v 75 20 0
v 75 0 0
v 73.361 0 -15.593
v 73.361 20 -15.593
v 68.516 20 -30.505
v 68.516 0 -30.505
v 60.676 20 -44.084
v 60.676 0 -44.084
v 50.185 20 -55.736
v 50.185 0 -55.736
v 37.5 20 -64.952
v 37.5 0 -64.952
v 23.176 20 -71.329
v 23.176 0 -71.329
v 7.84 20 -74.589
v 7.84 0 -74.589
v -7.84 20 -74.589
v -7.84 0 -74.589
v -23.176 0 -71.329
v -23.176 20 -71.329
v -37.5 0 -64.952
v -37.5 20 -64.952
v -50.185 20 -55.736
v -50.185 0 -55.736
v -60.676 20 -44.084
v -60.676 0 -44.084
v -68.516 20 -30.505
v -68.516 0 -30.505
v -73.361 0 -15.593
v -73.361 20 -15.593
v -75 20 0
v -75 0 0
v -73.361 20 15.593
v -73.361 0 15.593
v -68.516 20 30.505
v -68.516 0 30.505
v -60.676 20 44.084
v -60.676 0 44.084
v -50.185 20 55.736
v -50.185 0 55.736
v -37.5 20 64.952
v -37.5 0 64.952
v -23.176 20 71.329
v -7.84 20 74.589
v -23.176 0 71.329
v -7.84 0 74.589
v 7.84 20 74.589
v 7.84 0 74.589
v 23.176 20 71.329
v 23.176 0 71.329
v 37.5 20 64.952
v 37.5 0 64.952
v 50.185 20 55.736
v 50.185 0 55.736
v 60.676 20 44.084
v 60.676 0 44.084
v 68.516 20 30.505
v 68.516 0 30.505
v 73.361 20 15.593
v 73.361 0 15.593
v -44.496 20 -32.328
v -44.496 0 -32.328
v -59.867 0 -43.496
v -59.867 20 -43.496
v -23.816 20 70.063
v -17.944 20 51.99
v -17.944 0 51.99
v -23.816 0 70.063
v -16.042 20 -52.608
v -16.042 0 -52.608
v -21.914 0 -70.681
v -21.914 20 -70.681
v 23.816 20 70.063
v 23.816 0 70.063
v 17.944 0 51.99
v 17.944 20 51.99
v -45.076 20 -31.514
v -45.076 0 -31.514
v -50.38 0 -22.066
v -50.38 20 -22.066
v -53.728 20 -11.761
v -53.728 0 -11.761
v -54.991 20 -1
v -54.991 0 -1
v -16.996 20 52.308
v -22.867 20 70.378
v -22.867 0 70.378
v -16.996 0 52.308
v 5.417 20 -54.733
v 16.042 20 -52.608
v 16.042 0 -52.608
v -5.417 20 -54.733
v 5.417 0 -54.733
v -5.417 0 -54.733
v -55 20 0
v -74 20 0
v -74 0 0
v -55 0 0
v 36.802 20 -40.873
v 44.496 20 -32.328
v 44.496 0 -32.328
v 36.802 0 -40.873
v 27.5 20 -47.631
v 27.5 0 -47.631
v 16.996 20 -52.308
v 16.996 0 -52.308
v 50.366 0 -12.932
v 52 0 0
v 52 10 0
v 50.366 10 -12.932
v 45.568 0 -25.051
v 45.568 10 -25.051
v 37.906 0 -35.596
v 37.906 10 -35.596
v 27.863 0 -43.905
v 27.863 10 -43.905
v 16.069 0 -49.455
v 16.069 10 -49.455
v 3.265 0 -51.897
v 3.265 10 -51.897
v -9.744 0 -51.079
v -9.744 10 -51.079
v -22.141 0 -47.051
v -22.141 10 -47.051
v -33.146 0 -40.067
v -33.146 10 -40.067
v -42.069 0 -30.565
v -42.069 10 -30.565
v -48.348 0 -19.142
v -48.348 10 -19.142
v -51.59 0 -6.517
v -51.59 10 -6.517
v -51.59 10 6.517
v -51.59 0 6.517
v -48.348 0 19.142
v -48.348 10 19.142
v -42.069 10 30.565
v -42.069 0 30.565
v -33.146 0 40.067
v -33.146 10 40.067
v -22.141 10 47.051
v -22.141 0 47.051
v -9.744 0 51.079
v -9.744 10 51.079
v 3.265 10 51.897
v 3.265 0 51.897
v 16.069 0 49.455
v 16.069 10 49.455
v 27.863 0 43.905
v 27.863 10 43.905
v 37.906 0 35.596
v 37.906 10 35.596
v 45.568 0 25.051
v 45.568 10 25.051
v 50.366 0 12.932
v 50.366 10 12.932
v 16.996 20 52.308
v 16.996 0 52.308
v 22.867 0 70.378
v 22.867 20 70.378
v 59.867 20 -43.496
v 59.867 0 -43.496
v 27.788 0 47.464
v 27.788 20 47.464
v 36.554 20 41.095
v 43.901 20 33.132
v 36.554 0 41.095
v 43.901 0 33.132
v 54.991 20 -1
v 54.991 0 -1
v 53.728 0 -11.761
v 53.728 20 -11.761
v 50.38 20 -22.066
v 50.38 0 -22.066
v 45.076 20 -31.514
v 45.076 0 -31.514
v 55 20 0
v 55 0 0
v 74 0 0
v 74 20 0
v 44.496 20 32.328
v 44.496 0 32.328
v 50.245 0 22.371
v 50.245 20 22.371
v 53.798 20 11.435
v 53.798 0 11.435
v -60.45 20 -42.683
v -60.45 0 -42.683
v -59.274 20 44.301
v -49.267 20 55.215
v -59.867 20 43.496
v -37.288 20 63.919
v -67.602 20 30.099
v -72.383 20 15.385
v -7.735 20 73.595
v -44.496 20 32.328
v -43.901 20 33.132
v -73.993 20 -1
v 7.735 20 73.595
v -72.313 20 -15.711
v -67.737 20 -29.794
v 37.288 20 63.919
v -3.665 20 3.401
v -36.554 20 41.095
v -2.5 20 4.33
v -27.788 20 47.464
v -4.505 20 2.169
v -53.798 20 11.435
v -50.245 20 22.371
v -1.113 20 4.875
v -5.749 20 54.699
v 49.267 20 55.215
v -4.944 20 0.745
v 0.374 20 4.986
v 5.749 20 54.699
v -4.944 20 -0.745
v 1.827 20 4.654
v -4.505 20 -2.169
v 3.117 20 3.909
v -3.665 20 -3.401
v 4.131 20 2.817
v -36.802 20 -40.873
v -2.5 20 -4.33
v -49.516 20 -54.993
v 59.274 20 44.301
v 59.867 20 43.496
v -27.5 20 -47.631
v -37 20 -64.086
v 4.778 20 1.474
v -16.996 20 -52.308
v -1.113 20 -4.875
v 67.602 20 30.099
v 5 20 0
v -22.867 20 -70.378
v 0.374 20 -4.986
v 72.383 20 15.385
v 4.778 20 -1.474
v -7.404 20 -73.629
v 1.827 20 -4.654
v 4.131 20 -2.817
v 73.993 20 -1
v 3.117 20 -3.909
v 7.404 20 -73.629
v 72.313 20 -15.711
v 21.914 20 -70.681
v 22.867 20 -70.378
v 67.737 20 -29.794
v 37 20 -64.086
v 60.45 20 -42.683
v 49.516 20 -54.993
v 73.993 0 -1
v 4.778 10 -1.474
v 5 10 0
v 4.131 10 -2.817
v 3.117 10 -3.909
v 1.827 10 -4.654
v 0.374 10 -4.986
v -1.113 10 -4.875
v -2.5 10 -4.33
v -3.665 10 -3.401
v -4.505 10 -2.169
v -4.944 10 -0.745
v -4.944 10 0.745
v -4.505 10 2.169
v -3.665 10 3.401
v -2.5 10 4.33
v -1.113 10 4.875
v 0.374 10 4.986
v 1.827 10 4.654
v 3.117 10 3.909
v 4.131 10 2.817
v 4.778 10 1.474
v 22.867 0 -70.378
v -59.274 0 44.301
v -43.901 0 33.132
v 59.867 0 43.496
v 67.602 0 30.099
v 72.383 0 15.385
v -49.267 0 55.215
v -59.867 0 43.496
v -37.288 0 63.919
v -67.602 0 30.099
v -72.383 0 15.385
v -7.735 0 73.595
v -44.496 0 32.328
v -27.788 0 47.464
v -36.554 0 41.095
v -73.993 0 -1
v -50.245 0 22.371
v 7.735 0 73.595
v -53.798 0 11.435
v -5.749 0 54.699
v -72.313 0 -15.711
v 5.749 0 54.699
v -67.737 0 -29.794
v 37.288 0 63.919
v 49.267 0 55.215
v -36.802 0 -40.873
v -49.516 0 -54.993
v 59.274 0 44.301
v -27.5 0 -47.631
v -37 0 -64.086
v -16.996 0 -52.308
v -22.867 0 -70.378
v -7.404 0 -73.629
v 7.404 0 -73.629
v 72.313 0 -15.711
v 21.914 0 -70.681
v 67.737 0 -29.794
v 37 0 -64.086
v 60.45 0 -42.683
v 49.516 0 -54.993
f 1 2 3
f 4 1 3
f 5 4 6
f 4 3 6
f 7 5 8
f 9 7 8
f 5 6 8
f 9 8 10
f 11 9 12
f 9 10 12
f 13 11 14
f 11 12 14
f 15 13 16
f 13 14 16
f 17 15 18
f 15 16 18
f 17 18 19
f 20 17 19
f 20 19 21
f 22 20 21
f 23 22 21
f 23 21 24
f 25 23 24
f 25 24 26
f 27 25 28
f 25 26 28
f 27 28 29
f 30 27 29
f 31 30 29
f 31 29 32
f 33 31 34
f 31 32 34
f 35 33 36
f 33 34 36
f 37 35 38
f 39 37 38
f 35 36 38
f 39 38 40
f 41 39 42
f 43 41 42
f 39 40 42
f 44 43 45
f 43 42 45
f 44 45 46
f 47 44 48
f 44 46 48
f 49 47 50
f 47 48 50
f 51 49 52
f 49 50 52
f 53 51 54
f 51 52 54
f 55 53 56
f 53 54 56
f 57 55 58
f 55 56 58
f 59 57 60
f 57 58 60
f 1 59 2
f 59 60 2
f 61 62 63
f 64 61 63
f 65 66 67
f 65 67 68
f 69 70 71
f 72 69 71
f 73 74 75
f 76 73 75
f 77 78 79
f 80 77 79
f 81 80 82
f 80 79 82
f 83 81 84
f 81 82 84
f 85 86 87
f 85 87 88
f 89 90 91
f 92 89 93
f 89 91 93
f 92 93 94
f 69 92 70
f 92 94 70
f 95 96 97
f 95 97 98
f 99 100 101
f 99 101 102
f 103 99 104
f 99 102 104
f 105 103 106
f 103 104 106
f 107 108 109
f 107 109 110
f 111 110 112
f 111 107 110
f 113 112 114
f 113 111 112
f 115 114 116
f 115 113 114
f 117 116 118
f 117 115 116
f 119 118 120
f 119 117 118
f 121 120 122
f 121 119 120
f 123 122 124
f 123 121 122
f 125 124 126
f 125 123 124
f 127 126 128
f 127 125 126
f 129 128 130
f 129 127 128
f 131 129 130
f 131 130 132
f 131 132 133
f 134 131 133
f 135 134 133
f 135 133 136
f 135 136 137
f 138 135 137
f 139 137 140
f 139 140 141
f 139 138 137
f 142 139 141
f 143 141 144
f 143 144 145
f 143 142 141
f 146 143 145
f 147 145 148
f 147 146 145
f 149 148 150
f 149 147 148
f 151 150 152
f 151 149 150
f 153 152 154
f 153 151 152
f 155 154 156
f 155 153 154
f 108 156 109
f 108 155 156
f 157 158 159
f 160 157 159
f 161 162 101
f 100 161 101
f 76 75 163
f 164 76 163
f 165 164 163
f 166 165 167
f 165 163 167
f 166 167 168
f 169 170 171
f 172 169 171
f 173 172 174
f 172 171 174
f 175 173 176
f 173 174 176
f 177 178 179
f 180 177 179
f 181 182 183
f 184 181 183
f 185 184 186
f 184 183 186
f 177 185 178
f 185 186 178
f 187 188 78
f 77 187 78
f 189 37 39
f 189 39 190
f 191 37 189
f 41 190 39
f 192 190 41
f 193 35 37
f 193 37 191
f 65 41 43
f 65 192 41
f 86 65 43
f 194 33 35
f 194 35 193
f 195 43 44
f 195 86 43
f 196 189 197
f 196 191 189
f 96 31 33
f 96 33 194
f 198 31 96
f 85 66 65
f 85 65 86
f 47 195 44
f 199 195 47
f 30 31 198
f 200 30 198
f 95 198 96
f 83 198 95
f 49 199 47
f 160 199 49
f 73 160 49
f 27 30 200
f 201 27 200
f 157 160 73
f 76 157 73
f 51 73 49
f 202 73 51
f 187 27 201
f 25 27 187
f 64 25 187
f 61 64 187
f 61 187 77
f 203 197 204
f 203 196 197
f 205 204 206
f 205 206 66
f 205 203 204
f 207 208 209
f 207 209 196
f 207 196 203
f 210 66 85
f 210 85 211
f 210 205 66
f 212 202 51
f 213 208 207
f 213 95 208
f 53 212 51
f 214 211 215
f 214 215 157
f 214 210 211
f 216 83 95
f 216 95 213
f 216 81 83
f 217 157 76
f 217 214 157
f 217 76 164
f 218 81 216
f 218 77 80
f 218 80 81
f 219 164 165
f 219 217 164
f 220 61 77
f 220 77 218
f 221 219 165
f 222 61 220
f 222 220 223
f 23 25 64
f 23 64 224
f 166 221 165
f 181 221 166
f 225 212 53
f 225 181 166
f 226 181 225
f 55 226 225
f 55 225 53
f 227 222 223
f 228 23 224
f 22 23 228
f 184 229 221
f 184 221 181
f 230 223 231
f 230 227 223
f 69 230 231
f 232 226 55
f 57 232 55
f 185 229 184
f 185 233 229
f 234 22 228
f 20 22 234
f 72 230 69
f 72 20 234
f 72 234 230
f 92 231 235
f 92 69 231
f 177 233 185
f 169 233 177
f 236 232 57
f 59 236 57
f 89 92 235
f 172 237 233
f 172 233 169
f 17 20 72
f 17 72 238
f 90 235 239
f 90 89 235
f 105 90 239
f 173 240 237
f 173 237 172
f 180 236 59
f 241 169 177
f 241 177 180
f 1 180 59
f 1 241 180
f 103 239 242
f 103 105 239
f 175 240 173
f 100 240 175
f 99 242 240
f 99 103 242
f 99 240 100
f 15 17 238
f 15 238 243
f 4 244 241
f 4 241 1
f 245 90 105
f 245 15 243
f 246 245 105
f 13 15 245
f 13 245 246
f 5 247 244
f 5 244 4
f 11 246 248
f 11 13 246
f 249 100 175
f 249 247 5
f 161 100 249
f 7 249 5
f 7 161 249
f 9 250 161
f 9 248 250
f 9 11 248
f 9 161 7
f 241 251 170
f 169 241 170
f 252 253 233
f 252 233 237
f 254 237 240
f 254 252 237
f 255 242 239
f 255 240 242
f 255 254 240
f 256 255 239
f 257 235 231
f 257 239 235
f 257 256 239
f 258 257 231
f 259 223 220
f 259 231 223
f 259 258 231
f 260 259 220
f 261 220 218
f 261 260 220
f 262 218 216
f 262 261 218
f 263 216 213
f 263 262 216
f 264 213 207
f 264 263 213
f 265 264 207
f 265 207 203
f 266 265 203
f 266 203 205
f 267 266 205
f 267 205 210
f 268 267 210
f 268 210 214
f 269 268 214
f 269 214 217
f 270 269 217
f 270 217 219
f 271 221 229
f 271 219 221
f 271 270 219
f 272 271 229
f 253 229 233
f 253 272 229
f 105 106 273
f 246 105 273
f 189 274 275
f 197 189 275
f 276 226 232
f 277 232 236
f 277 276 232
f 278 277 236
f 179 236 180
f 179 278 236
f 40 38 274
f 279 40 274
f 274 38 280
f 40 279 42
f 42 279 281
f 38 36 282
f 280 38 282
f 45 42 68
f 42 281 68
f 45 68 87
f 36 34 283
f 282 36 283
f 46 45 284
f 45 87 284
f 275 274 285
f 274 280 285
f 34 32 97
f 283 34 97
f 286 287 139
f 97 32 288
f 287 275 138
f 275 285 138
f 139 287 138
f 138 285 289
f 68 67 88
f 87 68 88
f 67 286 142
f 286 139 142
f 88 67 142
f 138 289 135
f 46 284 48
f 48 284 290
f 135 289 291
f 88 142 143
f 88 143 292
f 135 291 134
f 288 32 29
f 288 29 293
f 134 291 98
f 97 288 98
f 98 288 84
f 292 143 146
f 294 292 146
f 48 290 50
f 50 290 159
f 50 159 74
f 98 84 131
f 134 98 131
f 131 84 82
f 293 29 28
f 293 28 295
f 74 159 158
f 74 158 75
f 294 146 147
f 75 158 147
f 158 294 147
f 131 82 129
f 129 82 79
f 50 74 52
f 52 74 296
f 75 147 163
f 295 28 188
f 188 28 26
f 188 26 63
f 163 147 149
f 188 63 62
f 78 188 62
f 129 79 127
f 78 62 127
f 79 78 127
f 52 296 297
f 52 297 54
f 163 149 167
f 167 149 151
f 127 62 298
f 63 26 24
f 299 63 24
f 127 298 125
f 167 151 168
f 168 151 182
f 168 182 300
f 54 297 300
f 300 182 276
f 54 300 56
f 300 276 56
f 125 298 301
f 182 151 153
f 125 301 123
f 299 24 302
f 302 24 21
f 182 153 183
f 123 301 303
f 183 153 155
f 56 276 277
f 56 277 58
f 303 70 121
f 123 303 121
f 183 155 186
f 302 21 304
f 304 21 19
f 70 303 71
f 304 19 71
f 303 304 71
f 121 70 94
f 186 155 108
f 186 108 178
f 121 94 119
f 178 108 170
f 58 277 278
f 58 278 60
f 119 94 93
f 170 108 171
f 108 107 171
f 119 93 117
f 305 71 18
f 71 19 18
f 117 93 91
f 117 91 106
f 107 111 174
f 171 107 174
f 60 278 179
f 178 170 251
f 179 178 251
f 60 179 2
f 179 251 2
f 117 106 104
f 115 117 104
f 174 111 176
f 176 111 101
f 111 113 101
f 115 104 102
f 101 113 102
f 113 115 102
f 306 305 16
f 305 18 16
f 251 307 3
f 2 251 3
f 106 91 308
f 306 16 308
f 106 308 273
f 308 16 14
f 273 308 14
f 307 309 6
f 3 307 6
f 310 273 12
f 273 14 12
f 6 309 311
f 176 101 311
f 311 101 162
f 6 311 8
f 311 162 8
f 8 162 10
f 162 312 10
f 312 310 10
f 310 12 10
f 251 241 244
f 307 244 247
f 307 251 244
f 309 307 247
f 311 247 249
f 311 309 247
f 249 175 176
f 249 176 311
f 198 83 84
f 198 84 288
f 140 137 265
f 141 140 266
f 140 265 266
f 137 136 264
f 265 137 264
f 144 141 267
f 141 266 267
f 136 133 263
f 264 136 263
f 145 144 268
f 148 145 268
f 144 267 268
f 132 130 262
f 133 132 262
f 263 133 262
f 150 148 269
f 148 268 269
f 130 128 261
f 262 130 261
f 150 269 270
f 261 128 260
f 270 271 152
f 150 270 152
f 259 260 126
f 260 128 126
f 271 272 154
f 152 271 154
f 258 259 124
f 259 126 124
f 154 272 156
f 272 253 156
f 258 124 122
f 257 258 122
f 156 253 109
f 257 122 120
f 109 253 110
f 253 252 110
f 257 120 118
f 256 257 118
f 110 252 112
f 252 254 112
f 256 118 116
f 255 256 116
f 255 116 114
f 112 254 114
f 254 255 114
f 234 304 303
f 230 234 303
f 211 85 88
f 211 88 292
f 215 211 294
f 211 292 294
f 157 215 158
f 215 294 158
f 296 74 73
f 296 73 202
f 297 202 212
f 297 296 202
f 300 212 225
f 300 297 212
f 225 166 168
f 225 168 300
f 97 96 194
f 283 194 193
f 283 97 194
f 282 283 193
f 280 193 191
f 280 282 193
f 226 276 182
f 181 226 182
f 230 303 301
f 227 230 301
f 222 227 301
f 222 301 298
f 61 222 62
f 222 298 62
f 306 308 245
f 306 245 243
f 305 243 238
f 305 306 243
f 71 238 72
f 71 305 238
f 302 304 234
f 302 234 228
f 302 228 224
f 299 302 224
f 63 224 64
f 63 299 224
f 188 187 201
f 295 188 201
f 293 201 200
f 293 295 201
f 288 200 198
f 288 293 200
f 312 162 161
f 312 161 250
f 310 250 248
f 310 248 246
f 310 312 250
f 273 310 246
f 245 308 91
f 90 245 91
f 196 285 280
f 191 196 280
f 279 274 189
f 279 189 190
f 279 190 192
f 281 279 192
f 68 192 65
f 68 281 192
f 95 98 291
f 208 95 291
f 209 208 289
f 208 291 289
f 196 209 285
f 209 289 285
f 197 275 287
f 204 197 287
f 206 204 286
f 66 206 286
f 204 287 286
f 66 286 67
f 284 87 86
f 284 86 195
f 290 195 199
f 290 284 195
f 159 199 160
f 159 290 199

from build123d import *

# Parameters (mm, degrees)
SKETCH1_R           = 75
SKETCH1_R_2         = 74
BOSS_EXTRUDE1_DEPTH = 20
SKETCH2_R           = 55
BOSS_EXTRUDE2_DEPTH = 20
BOSS_EXTRUDE3_DEPTH = 20
SKETCH4_R           = 52
CUT_EXTRUDE3_DEPTH  = 10
SKETCH5_R           = 5
CUT_EXTRUDE4_DEPTH  = 21


with BuildPart() as part:
    # Sketch1 → Boss-Extrude1 (new body)
    with BuildSketch(Plane(origin=(0, 0, 0), x_dir=(1, 0, 0), z_dir=(0, 1, 0))):
        Circle(SKETCH1_R)
        Circle(SKETCH1_R_2, mode=Mode.SUBTRACT)
    extrude(amount=BOSS_EXTRUDE1_DEPTH)



with BuildPart() as body_2:
    # Sketch2 → Boss-Extrude2 (new body)
    with BuildSketch(Plane(origin=(0, 0, 0), x_dir=(1, 0, 0), z_dir=(0, 1, 0))):
        Circle(SKETCH2_R)
    extrude(amount=BOSS_EXTRUDE2_DEPTH)


with BuildPart() as part_1:
    add(part.part)

    add(body_2.part)  # Boss-Extrude3 merges body 2
    # Sketch3 → Boss-Extrude3 (add)
    with BuildSketch(Plane(origin=(0, 0, 0), x_dir=(1, 0, 0), z_dir=(0, 1, 0))):
        with BuildLine():
            Line((-74, 0), (-1.701301617, 0))
            Line((-1.701301617, 0), (-1.175570505, -0.381966011))
            Line((-1.175570505, -0.381966011), (-1.37638192, -1))
            Line((-1.37638192, -1), (-59.867257584, -43.49610867))
            ThreePointArc((-59.867257584, -43.49610867), (-59.571991588, -43.899633464), (-59.274005751, -44.301153961))
            Line((-59.274005751, -44.301153961), (-1.902113033, -2.618033989))
            Line((-1.902113033, -2.618033989), (-23.816226052, -70.062738861))
            ThreePointArc((-23.816226052, -70.062738861), (-23.34227468, -70.222063575), (-22.867257584, -70.378182206))
            Line((-22.867257584, -70.378182206), (-0.525731112, -1.618033989))
            Line((-0.525731112, -1.618033989), (0, -1.236067977))
            Line((0, -1.236067977), (0.525731112, -1.618033989))
            Line((0.525731112, -1.618033989), (22.867257584, -70.378182206))
            ThreePointArc((22.867257584, -70.378182206), (23.34227468, -70.222063575), (23.816226052, -70.062738861))
            Line((23.816226052, -70.062738861), (1.902113033, -2.618033989))
            Line((1.902113033, -2.618033989), (59.274005751, -44.301153961))
            ThreePointArc((59.274005751, -44.301153961), (59.571991588, -43.899633464), (59.867257584, -43.49610867))
            Line((59.867257584, -43.49610867), (1.37638192, -1))
            Line((1.37638192, -1), (1.175570505, -0.381966011))
            Line((1.175570505, -0.381966011), (1.701301617, 0))
            Line((1.701301617, 0), (74, 0))
            ThreePointArc((74, 0), (73.998310714, 0.500011414), (73.993242935, 1))
            Line((73.993242935, 1), (3.077683537, 1))
            Line((3.077683537, 1), (60.449576255, 42.683119972))
            ThreePointArc((60.449576255, 42.683119972), (60.159790258, 43.090598001), (59.867257584, 43.49610867))
            Line((59.867257584, 43.49610867), (1.37638192, 1))
            Line((1.37638192, 1), (0.726542528, 1))
            Line((0.726542528, 1), (0.525731112, 1.618033989))
            Line((0.525731112, 1.618033989), (22.867257584, 70.378182206))
            ThreePointArc((22.867257584, 70.378182206), (22.391196452, 70.531087624), (21.914113019, 70.680772849))
            Line((21.914113019, 70.680772849), (0, 3.236067977))
            Line((0, 3.236067977), (-21.914113019, 70.680772849))
            ThreePointArc((-21.914113019, 70.680772849), (-22.391196452, 70.531087624), (-22.867257584, 70.378182206))
            Line((-22.867257584, 70.378182206), (-0.525731112, 1.618033989))
            Line((-0.525731112, 1.618033989), (-0.726542528, 1))
            Line((-0.726542528, 1), (-1.37638192, 1))
            Line((-1.37638192, 1), (-59.867257584, 43.49610867))
            ThreePointArc((-59.867257584, 43.49610867), (-60.159790258, 43.090598001), (-60.449576255, 42.683119972))
            Line((-60.449576255, 42.683119972), (-3.077683537, 1))
            Line((-3.077683537, 1), (-73.993242935, 1))
            ThreePointArc((-73.993242935, 1), (-73.998310714, 0.500011414), (-74, 0))
        make_face()
    extrude(amount=BOSS_EXTRUDE3_DEPTH)

    # Sketch4 → Cut-Extrude3 (cut)
    with BuildSketch(Plane(origin=(0, 0, 0), x_dir=(1, 0, 0), z_dir=(0, 1, 0))):
        Circle(SKETCH4_R)
    extrude(amount=CUT_EXTRUDE3_DEPTH, mode=Mode.SUBTRACT)

    # Sketch5 → Cut-Extrude4 (cut, through all)
    with BuildSketch(Plane(origin=(0, 0, 0), x_dir=(1, 0, 0), z_dir=(0, 1, 0))):
        Circle(SKETCH5_R)
    extrude(amount=CUT_EXTRUDE4_DEPTH, mode=Mode.SUBTRACT)


solid = part_1.part
